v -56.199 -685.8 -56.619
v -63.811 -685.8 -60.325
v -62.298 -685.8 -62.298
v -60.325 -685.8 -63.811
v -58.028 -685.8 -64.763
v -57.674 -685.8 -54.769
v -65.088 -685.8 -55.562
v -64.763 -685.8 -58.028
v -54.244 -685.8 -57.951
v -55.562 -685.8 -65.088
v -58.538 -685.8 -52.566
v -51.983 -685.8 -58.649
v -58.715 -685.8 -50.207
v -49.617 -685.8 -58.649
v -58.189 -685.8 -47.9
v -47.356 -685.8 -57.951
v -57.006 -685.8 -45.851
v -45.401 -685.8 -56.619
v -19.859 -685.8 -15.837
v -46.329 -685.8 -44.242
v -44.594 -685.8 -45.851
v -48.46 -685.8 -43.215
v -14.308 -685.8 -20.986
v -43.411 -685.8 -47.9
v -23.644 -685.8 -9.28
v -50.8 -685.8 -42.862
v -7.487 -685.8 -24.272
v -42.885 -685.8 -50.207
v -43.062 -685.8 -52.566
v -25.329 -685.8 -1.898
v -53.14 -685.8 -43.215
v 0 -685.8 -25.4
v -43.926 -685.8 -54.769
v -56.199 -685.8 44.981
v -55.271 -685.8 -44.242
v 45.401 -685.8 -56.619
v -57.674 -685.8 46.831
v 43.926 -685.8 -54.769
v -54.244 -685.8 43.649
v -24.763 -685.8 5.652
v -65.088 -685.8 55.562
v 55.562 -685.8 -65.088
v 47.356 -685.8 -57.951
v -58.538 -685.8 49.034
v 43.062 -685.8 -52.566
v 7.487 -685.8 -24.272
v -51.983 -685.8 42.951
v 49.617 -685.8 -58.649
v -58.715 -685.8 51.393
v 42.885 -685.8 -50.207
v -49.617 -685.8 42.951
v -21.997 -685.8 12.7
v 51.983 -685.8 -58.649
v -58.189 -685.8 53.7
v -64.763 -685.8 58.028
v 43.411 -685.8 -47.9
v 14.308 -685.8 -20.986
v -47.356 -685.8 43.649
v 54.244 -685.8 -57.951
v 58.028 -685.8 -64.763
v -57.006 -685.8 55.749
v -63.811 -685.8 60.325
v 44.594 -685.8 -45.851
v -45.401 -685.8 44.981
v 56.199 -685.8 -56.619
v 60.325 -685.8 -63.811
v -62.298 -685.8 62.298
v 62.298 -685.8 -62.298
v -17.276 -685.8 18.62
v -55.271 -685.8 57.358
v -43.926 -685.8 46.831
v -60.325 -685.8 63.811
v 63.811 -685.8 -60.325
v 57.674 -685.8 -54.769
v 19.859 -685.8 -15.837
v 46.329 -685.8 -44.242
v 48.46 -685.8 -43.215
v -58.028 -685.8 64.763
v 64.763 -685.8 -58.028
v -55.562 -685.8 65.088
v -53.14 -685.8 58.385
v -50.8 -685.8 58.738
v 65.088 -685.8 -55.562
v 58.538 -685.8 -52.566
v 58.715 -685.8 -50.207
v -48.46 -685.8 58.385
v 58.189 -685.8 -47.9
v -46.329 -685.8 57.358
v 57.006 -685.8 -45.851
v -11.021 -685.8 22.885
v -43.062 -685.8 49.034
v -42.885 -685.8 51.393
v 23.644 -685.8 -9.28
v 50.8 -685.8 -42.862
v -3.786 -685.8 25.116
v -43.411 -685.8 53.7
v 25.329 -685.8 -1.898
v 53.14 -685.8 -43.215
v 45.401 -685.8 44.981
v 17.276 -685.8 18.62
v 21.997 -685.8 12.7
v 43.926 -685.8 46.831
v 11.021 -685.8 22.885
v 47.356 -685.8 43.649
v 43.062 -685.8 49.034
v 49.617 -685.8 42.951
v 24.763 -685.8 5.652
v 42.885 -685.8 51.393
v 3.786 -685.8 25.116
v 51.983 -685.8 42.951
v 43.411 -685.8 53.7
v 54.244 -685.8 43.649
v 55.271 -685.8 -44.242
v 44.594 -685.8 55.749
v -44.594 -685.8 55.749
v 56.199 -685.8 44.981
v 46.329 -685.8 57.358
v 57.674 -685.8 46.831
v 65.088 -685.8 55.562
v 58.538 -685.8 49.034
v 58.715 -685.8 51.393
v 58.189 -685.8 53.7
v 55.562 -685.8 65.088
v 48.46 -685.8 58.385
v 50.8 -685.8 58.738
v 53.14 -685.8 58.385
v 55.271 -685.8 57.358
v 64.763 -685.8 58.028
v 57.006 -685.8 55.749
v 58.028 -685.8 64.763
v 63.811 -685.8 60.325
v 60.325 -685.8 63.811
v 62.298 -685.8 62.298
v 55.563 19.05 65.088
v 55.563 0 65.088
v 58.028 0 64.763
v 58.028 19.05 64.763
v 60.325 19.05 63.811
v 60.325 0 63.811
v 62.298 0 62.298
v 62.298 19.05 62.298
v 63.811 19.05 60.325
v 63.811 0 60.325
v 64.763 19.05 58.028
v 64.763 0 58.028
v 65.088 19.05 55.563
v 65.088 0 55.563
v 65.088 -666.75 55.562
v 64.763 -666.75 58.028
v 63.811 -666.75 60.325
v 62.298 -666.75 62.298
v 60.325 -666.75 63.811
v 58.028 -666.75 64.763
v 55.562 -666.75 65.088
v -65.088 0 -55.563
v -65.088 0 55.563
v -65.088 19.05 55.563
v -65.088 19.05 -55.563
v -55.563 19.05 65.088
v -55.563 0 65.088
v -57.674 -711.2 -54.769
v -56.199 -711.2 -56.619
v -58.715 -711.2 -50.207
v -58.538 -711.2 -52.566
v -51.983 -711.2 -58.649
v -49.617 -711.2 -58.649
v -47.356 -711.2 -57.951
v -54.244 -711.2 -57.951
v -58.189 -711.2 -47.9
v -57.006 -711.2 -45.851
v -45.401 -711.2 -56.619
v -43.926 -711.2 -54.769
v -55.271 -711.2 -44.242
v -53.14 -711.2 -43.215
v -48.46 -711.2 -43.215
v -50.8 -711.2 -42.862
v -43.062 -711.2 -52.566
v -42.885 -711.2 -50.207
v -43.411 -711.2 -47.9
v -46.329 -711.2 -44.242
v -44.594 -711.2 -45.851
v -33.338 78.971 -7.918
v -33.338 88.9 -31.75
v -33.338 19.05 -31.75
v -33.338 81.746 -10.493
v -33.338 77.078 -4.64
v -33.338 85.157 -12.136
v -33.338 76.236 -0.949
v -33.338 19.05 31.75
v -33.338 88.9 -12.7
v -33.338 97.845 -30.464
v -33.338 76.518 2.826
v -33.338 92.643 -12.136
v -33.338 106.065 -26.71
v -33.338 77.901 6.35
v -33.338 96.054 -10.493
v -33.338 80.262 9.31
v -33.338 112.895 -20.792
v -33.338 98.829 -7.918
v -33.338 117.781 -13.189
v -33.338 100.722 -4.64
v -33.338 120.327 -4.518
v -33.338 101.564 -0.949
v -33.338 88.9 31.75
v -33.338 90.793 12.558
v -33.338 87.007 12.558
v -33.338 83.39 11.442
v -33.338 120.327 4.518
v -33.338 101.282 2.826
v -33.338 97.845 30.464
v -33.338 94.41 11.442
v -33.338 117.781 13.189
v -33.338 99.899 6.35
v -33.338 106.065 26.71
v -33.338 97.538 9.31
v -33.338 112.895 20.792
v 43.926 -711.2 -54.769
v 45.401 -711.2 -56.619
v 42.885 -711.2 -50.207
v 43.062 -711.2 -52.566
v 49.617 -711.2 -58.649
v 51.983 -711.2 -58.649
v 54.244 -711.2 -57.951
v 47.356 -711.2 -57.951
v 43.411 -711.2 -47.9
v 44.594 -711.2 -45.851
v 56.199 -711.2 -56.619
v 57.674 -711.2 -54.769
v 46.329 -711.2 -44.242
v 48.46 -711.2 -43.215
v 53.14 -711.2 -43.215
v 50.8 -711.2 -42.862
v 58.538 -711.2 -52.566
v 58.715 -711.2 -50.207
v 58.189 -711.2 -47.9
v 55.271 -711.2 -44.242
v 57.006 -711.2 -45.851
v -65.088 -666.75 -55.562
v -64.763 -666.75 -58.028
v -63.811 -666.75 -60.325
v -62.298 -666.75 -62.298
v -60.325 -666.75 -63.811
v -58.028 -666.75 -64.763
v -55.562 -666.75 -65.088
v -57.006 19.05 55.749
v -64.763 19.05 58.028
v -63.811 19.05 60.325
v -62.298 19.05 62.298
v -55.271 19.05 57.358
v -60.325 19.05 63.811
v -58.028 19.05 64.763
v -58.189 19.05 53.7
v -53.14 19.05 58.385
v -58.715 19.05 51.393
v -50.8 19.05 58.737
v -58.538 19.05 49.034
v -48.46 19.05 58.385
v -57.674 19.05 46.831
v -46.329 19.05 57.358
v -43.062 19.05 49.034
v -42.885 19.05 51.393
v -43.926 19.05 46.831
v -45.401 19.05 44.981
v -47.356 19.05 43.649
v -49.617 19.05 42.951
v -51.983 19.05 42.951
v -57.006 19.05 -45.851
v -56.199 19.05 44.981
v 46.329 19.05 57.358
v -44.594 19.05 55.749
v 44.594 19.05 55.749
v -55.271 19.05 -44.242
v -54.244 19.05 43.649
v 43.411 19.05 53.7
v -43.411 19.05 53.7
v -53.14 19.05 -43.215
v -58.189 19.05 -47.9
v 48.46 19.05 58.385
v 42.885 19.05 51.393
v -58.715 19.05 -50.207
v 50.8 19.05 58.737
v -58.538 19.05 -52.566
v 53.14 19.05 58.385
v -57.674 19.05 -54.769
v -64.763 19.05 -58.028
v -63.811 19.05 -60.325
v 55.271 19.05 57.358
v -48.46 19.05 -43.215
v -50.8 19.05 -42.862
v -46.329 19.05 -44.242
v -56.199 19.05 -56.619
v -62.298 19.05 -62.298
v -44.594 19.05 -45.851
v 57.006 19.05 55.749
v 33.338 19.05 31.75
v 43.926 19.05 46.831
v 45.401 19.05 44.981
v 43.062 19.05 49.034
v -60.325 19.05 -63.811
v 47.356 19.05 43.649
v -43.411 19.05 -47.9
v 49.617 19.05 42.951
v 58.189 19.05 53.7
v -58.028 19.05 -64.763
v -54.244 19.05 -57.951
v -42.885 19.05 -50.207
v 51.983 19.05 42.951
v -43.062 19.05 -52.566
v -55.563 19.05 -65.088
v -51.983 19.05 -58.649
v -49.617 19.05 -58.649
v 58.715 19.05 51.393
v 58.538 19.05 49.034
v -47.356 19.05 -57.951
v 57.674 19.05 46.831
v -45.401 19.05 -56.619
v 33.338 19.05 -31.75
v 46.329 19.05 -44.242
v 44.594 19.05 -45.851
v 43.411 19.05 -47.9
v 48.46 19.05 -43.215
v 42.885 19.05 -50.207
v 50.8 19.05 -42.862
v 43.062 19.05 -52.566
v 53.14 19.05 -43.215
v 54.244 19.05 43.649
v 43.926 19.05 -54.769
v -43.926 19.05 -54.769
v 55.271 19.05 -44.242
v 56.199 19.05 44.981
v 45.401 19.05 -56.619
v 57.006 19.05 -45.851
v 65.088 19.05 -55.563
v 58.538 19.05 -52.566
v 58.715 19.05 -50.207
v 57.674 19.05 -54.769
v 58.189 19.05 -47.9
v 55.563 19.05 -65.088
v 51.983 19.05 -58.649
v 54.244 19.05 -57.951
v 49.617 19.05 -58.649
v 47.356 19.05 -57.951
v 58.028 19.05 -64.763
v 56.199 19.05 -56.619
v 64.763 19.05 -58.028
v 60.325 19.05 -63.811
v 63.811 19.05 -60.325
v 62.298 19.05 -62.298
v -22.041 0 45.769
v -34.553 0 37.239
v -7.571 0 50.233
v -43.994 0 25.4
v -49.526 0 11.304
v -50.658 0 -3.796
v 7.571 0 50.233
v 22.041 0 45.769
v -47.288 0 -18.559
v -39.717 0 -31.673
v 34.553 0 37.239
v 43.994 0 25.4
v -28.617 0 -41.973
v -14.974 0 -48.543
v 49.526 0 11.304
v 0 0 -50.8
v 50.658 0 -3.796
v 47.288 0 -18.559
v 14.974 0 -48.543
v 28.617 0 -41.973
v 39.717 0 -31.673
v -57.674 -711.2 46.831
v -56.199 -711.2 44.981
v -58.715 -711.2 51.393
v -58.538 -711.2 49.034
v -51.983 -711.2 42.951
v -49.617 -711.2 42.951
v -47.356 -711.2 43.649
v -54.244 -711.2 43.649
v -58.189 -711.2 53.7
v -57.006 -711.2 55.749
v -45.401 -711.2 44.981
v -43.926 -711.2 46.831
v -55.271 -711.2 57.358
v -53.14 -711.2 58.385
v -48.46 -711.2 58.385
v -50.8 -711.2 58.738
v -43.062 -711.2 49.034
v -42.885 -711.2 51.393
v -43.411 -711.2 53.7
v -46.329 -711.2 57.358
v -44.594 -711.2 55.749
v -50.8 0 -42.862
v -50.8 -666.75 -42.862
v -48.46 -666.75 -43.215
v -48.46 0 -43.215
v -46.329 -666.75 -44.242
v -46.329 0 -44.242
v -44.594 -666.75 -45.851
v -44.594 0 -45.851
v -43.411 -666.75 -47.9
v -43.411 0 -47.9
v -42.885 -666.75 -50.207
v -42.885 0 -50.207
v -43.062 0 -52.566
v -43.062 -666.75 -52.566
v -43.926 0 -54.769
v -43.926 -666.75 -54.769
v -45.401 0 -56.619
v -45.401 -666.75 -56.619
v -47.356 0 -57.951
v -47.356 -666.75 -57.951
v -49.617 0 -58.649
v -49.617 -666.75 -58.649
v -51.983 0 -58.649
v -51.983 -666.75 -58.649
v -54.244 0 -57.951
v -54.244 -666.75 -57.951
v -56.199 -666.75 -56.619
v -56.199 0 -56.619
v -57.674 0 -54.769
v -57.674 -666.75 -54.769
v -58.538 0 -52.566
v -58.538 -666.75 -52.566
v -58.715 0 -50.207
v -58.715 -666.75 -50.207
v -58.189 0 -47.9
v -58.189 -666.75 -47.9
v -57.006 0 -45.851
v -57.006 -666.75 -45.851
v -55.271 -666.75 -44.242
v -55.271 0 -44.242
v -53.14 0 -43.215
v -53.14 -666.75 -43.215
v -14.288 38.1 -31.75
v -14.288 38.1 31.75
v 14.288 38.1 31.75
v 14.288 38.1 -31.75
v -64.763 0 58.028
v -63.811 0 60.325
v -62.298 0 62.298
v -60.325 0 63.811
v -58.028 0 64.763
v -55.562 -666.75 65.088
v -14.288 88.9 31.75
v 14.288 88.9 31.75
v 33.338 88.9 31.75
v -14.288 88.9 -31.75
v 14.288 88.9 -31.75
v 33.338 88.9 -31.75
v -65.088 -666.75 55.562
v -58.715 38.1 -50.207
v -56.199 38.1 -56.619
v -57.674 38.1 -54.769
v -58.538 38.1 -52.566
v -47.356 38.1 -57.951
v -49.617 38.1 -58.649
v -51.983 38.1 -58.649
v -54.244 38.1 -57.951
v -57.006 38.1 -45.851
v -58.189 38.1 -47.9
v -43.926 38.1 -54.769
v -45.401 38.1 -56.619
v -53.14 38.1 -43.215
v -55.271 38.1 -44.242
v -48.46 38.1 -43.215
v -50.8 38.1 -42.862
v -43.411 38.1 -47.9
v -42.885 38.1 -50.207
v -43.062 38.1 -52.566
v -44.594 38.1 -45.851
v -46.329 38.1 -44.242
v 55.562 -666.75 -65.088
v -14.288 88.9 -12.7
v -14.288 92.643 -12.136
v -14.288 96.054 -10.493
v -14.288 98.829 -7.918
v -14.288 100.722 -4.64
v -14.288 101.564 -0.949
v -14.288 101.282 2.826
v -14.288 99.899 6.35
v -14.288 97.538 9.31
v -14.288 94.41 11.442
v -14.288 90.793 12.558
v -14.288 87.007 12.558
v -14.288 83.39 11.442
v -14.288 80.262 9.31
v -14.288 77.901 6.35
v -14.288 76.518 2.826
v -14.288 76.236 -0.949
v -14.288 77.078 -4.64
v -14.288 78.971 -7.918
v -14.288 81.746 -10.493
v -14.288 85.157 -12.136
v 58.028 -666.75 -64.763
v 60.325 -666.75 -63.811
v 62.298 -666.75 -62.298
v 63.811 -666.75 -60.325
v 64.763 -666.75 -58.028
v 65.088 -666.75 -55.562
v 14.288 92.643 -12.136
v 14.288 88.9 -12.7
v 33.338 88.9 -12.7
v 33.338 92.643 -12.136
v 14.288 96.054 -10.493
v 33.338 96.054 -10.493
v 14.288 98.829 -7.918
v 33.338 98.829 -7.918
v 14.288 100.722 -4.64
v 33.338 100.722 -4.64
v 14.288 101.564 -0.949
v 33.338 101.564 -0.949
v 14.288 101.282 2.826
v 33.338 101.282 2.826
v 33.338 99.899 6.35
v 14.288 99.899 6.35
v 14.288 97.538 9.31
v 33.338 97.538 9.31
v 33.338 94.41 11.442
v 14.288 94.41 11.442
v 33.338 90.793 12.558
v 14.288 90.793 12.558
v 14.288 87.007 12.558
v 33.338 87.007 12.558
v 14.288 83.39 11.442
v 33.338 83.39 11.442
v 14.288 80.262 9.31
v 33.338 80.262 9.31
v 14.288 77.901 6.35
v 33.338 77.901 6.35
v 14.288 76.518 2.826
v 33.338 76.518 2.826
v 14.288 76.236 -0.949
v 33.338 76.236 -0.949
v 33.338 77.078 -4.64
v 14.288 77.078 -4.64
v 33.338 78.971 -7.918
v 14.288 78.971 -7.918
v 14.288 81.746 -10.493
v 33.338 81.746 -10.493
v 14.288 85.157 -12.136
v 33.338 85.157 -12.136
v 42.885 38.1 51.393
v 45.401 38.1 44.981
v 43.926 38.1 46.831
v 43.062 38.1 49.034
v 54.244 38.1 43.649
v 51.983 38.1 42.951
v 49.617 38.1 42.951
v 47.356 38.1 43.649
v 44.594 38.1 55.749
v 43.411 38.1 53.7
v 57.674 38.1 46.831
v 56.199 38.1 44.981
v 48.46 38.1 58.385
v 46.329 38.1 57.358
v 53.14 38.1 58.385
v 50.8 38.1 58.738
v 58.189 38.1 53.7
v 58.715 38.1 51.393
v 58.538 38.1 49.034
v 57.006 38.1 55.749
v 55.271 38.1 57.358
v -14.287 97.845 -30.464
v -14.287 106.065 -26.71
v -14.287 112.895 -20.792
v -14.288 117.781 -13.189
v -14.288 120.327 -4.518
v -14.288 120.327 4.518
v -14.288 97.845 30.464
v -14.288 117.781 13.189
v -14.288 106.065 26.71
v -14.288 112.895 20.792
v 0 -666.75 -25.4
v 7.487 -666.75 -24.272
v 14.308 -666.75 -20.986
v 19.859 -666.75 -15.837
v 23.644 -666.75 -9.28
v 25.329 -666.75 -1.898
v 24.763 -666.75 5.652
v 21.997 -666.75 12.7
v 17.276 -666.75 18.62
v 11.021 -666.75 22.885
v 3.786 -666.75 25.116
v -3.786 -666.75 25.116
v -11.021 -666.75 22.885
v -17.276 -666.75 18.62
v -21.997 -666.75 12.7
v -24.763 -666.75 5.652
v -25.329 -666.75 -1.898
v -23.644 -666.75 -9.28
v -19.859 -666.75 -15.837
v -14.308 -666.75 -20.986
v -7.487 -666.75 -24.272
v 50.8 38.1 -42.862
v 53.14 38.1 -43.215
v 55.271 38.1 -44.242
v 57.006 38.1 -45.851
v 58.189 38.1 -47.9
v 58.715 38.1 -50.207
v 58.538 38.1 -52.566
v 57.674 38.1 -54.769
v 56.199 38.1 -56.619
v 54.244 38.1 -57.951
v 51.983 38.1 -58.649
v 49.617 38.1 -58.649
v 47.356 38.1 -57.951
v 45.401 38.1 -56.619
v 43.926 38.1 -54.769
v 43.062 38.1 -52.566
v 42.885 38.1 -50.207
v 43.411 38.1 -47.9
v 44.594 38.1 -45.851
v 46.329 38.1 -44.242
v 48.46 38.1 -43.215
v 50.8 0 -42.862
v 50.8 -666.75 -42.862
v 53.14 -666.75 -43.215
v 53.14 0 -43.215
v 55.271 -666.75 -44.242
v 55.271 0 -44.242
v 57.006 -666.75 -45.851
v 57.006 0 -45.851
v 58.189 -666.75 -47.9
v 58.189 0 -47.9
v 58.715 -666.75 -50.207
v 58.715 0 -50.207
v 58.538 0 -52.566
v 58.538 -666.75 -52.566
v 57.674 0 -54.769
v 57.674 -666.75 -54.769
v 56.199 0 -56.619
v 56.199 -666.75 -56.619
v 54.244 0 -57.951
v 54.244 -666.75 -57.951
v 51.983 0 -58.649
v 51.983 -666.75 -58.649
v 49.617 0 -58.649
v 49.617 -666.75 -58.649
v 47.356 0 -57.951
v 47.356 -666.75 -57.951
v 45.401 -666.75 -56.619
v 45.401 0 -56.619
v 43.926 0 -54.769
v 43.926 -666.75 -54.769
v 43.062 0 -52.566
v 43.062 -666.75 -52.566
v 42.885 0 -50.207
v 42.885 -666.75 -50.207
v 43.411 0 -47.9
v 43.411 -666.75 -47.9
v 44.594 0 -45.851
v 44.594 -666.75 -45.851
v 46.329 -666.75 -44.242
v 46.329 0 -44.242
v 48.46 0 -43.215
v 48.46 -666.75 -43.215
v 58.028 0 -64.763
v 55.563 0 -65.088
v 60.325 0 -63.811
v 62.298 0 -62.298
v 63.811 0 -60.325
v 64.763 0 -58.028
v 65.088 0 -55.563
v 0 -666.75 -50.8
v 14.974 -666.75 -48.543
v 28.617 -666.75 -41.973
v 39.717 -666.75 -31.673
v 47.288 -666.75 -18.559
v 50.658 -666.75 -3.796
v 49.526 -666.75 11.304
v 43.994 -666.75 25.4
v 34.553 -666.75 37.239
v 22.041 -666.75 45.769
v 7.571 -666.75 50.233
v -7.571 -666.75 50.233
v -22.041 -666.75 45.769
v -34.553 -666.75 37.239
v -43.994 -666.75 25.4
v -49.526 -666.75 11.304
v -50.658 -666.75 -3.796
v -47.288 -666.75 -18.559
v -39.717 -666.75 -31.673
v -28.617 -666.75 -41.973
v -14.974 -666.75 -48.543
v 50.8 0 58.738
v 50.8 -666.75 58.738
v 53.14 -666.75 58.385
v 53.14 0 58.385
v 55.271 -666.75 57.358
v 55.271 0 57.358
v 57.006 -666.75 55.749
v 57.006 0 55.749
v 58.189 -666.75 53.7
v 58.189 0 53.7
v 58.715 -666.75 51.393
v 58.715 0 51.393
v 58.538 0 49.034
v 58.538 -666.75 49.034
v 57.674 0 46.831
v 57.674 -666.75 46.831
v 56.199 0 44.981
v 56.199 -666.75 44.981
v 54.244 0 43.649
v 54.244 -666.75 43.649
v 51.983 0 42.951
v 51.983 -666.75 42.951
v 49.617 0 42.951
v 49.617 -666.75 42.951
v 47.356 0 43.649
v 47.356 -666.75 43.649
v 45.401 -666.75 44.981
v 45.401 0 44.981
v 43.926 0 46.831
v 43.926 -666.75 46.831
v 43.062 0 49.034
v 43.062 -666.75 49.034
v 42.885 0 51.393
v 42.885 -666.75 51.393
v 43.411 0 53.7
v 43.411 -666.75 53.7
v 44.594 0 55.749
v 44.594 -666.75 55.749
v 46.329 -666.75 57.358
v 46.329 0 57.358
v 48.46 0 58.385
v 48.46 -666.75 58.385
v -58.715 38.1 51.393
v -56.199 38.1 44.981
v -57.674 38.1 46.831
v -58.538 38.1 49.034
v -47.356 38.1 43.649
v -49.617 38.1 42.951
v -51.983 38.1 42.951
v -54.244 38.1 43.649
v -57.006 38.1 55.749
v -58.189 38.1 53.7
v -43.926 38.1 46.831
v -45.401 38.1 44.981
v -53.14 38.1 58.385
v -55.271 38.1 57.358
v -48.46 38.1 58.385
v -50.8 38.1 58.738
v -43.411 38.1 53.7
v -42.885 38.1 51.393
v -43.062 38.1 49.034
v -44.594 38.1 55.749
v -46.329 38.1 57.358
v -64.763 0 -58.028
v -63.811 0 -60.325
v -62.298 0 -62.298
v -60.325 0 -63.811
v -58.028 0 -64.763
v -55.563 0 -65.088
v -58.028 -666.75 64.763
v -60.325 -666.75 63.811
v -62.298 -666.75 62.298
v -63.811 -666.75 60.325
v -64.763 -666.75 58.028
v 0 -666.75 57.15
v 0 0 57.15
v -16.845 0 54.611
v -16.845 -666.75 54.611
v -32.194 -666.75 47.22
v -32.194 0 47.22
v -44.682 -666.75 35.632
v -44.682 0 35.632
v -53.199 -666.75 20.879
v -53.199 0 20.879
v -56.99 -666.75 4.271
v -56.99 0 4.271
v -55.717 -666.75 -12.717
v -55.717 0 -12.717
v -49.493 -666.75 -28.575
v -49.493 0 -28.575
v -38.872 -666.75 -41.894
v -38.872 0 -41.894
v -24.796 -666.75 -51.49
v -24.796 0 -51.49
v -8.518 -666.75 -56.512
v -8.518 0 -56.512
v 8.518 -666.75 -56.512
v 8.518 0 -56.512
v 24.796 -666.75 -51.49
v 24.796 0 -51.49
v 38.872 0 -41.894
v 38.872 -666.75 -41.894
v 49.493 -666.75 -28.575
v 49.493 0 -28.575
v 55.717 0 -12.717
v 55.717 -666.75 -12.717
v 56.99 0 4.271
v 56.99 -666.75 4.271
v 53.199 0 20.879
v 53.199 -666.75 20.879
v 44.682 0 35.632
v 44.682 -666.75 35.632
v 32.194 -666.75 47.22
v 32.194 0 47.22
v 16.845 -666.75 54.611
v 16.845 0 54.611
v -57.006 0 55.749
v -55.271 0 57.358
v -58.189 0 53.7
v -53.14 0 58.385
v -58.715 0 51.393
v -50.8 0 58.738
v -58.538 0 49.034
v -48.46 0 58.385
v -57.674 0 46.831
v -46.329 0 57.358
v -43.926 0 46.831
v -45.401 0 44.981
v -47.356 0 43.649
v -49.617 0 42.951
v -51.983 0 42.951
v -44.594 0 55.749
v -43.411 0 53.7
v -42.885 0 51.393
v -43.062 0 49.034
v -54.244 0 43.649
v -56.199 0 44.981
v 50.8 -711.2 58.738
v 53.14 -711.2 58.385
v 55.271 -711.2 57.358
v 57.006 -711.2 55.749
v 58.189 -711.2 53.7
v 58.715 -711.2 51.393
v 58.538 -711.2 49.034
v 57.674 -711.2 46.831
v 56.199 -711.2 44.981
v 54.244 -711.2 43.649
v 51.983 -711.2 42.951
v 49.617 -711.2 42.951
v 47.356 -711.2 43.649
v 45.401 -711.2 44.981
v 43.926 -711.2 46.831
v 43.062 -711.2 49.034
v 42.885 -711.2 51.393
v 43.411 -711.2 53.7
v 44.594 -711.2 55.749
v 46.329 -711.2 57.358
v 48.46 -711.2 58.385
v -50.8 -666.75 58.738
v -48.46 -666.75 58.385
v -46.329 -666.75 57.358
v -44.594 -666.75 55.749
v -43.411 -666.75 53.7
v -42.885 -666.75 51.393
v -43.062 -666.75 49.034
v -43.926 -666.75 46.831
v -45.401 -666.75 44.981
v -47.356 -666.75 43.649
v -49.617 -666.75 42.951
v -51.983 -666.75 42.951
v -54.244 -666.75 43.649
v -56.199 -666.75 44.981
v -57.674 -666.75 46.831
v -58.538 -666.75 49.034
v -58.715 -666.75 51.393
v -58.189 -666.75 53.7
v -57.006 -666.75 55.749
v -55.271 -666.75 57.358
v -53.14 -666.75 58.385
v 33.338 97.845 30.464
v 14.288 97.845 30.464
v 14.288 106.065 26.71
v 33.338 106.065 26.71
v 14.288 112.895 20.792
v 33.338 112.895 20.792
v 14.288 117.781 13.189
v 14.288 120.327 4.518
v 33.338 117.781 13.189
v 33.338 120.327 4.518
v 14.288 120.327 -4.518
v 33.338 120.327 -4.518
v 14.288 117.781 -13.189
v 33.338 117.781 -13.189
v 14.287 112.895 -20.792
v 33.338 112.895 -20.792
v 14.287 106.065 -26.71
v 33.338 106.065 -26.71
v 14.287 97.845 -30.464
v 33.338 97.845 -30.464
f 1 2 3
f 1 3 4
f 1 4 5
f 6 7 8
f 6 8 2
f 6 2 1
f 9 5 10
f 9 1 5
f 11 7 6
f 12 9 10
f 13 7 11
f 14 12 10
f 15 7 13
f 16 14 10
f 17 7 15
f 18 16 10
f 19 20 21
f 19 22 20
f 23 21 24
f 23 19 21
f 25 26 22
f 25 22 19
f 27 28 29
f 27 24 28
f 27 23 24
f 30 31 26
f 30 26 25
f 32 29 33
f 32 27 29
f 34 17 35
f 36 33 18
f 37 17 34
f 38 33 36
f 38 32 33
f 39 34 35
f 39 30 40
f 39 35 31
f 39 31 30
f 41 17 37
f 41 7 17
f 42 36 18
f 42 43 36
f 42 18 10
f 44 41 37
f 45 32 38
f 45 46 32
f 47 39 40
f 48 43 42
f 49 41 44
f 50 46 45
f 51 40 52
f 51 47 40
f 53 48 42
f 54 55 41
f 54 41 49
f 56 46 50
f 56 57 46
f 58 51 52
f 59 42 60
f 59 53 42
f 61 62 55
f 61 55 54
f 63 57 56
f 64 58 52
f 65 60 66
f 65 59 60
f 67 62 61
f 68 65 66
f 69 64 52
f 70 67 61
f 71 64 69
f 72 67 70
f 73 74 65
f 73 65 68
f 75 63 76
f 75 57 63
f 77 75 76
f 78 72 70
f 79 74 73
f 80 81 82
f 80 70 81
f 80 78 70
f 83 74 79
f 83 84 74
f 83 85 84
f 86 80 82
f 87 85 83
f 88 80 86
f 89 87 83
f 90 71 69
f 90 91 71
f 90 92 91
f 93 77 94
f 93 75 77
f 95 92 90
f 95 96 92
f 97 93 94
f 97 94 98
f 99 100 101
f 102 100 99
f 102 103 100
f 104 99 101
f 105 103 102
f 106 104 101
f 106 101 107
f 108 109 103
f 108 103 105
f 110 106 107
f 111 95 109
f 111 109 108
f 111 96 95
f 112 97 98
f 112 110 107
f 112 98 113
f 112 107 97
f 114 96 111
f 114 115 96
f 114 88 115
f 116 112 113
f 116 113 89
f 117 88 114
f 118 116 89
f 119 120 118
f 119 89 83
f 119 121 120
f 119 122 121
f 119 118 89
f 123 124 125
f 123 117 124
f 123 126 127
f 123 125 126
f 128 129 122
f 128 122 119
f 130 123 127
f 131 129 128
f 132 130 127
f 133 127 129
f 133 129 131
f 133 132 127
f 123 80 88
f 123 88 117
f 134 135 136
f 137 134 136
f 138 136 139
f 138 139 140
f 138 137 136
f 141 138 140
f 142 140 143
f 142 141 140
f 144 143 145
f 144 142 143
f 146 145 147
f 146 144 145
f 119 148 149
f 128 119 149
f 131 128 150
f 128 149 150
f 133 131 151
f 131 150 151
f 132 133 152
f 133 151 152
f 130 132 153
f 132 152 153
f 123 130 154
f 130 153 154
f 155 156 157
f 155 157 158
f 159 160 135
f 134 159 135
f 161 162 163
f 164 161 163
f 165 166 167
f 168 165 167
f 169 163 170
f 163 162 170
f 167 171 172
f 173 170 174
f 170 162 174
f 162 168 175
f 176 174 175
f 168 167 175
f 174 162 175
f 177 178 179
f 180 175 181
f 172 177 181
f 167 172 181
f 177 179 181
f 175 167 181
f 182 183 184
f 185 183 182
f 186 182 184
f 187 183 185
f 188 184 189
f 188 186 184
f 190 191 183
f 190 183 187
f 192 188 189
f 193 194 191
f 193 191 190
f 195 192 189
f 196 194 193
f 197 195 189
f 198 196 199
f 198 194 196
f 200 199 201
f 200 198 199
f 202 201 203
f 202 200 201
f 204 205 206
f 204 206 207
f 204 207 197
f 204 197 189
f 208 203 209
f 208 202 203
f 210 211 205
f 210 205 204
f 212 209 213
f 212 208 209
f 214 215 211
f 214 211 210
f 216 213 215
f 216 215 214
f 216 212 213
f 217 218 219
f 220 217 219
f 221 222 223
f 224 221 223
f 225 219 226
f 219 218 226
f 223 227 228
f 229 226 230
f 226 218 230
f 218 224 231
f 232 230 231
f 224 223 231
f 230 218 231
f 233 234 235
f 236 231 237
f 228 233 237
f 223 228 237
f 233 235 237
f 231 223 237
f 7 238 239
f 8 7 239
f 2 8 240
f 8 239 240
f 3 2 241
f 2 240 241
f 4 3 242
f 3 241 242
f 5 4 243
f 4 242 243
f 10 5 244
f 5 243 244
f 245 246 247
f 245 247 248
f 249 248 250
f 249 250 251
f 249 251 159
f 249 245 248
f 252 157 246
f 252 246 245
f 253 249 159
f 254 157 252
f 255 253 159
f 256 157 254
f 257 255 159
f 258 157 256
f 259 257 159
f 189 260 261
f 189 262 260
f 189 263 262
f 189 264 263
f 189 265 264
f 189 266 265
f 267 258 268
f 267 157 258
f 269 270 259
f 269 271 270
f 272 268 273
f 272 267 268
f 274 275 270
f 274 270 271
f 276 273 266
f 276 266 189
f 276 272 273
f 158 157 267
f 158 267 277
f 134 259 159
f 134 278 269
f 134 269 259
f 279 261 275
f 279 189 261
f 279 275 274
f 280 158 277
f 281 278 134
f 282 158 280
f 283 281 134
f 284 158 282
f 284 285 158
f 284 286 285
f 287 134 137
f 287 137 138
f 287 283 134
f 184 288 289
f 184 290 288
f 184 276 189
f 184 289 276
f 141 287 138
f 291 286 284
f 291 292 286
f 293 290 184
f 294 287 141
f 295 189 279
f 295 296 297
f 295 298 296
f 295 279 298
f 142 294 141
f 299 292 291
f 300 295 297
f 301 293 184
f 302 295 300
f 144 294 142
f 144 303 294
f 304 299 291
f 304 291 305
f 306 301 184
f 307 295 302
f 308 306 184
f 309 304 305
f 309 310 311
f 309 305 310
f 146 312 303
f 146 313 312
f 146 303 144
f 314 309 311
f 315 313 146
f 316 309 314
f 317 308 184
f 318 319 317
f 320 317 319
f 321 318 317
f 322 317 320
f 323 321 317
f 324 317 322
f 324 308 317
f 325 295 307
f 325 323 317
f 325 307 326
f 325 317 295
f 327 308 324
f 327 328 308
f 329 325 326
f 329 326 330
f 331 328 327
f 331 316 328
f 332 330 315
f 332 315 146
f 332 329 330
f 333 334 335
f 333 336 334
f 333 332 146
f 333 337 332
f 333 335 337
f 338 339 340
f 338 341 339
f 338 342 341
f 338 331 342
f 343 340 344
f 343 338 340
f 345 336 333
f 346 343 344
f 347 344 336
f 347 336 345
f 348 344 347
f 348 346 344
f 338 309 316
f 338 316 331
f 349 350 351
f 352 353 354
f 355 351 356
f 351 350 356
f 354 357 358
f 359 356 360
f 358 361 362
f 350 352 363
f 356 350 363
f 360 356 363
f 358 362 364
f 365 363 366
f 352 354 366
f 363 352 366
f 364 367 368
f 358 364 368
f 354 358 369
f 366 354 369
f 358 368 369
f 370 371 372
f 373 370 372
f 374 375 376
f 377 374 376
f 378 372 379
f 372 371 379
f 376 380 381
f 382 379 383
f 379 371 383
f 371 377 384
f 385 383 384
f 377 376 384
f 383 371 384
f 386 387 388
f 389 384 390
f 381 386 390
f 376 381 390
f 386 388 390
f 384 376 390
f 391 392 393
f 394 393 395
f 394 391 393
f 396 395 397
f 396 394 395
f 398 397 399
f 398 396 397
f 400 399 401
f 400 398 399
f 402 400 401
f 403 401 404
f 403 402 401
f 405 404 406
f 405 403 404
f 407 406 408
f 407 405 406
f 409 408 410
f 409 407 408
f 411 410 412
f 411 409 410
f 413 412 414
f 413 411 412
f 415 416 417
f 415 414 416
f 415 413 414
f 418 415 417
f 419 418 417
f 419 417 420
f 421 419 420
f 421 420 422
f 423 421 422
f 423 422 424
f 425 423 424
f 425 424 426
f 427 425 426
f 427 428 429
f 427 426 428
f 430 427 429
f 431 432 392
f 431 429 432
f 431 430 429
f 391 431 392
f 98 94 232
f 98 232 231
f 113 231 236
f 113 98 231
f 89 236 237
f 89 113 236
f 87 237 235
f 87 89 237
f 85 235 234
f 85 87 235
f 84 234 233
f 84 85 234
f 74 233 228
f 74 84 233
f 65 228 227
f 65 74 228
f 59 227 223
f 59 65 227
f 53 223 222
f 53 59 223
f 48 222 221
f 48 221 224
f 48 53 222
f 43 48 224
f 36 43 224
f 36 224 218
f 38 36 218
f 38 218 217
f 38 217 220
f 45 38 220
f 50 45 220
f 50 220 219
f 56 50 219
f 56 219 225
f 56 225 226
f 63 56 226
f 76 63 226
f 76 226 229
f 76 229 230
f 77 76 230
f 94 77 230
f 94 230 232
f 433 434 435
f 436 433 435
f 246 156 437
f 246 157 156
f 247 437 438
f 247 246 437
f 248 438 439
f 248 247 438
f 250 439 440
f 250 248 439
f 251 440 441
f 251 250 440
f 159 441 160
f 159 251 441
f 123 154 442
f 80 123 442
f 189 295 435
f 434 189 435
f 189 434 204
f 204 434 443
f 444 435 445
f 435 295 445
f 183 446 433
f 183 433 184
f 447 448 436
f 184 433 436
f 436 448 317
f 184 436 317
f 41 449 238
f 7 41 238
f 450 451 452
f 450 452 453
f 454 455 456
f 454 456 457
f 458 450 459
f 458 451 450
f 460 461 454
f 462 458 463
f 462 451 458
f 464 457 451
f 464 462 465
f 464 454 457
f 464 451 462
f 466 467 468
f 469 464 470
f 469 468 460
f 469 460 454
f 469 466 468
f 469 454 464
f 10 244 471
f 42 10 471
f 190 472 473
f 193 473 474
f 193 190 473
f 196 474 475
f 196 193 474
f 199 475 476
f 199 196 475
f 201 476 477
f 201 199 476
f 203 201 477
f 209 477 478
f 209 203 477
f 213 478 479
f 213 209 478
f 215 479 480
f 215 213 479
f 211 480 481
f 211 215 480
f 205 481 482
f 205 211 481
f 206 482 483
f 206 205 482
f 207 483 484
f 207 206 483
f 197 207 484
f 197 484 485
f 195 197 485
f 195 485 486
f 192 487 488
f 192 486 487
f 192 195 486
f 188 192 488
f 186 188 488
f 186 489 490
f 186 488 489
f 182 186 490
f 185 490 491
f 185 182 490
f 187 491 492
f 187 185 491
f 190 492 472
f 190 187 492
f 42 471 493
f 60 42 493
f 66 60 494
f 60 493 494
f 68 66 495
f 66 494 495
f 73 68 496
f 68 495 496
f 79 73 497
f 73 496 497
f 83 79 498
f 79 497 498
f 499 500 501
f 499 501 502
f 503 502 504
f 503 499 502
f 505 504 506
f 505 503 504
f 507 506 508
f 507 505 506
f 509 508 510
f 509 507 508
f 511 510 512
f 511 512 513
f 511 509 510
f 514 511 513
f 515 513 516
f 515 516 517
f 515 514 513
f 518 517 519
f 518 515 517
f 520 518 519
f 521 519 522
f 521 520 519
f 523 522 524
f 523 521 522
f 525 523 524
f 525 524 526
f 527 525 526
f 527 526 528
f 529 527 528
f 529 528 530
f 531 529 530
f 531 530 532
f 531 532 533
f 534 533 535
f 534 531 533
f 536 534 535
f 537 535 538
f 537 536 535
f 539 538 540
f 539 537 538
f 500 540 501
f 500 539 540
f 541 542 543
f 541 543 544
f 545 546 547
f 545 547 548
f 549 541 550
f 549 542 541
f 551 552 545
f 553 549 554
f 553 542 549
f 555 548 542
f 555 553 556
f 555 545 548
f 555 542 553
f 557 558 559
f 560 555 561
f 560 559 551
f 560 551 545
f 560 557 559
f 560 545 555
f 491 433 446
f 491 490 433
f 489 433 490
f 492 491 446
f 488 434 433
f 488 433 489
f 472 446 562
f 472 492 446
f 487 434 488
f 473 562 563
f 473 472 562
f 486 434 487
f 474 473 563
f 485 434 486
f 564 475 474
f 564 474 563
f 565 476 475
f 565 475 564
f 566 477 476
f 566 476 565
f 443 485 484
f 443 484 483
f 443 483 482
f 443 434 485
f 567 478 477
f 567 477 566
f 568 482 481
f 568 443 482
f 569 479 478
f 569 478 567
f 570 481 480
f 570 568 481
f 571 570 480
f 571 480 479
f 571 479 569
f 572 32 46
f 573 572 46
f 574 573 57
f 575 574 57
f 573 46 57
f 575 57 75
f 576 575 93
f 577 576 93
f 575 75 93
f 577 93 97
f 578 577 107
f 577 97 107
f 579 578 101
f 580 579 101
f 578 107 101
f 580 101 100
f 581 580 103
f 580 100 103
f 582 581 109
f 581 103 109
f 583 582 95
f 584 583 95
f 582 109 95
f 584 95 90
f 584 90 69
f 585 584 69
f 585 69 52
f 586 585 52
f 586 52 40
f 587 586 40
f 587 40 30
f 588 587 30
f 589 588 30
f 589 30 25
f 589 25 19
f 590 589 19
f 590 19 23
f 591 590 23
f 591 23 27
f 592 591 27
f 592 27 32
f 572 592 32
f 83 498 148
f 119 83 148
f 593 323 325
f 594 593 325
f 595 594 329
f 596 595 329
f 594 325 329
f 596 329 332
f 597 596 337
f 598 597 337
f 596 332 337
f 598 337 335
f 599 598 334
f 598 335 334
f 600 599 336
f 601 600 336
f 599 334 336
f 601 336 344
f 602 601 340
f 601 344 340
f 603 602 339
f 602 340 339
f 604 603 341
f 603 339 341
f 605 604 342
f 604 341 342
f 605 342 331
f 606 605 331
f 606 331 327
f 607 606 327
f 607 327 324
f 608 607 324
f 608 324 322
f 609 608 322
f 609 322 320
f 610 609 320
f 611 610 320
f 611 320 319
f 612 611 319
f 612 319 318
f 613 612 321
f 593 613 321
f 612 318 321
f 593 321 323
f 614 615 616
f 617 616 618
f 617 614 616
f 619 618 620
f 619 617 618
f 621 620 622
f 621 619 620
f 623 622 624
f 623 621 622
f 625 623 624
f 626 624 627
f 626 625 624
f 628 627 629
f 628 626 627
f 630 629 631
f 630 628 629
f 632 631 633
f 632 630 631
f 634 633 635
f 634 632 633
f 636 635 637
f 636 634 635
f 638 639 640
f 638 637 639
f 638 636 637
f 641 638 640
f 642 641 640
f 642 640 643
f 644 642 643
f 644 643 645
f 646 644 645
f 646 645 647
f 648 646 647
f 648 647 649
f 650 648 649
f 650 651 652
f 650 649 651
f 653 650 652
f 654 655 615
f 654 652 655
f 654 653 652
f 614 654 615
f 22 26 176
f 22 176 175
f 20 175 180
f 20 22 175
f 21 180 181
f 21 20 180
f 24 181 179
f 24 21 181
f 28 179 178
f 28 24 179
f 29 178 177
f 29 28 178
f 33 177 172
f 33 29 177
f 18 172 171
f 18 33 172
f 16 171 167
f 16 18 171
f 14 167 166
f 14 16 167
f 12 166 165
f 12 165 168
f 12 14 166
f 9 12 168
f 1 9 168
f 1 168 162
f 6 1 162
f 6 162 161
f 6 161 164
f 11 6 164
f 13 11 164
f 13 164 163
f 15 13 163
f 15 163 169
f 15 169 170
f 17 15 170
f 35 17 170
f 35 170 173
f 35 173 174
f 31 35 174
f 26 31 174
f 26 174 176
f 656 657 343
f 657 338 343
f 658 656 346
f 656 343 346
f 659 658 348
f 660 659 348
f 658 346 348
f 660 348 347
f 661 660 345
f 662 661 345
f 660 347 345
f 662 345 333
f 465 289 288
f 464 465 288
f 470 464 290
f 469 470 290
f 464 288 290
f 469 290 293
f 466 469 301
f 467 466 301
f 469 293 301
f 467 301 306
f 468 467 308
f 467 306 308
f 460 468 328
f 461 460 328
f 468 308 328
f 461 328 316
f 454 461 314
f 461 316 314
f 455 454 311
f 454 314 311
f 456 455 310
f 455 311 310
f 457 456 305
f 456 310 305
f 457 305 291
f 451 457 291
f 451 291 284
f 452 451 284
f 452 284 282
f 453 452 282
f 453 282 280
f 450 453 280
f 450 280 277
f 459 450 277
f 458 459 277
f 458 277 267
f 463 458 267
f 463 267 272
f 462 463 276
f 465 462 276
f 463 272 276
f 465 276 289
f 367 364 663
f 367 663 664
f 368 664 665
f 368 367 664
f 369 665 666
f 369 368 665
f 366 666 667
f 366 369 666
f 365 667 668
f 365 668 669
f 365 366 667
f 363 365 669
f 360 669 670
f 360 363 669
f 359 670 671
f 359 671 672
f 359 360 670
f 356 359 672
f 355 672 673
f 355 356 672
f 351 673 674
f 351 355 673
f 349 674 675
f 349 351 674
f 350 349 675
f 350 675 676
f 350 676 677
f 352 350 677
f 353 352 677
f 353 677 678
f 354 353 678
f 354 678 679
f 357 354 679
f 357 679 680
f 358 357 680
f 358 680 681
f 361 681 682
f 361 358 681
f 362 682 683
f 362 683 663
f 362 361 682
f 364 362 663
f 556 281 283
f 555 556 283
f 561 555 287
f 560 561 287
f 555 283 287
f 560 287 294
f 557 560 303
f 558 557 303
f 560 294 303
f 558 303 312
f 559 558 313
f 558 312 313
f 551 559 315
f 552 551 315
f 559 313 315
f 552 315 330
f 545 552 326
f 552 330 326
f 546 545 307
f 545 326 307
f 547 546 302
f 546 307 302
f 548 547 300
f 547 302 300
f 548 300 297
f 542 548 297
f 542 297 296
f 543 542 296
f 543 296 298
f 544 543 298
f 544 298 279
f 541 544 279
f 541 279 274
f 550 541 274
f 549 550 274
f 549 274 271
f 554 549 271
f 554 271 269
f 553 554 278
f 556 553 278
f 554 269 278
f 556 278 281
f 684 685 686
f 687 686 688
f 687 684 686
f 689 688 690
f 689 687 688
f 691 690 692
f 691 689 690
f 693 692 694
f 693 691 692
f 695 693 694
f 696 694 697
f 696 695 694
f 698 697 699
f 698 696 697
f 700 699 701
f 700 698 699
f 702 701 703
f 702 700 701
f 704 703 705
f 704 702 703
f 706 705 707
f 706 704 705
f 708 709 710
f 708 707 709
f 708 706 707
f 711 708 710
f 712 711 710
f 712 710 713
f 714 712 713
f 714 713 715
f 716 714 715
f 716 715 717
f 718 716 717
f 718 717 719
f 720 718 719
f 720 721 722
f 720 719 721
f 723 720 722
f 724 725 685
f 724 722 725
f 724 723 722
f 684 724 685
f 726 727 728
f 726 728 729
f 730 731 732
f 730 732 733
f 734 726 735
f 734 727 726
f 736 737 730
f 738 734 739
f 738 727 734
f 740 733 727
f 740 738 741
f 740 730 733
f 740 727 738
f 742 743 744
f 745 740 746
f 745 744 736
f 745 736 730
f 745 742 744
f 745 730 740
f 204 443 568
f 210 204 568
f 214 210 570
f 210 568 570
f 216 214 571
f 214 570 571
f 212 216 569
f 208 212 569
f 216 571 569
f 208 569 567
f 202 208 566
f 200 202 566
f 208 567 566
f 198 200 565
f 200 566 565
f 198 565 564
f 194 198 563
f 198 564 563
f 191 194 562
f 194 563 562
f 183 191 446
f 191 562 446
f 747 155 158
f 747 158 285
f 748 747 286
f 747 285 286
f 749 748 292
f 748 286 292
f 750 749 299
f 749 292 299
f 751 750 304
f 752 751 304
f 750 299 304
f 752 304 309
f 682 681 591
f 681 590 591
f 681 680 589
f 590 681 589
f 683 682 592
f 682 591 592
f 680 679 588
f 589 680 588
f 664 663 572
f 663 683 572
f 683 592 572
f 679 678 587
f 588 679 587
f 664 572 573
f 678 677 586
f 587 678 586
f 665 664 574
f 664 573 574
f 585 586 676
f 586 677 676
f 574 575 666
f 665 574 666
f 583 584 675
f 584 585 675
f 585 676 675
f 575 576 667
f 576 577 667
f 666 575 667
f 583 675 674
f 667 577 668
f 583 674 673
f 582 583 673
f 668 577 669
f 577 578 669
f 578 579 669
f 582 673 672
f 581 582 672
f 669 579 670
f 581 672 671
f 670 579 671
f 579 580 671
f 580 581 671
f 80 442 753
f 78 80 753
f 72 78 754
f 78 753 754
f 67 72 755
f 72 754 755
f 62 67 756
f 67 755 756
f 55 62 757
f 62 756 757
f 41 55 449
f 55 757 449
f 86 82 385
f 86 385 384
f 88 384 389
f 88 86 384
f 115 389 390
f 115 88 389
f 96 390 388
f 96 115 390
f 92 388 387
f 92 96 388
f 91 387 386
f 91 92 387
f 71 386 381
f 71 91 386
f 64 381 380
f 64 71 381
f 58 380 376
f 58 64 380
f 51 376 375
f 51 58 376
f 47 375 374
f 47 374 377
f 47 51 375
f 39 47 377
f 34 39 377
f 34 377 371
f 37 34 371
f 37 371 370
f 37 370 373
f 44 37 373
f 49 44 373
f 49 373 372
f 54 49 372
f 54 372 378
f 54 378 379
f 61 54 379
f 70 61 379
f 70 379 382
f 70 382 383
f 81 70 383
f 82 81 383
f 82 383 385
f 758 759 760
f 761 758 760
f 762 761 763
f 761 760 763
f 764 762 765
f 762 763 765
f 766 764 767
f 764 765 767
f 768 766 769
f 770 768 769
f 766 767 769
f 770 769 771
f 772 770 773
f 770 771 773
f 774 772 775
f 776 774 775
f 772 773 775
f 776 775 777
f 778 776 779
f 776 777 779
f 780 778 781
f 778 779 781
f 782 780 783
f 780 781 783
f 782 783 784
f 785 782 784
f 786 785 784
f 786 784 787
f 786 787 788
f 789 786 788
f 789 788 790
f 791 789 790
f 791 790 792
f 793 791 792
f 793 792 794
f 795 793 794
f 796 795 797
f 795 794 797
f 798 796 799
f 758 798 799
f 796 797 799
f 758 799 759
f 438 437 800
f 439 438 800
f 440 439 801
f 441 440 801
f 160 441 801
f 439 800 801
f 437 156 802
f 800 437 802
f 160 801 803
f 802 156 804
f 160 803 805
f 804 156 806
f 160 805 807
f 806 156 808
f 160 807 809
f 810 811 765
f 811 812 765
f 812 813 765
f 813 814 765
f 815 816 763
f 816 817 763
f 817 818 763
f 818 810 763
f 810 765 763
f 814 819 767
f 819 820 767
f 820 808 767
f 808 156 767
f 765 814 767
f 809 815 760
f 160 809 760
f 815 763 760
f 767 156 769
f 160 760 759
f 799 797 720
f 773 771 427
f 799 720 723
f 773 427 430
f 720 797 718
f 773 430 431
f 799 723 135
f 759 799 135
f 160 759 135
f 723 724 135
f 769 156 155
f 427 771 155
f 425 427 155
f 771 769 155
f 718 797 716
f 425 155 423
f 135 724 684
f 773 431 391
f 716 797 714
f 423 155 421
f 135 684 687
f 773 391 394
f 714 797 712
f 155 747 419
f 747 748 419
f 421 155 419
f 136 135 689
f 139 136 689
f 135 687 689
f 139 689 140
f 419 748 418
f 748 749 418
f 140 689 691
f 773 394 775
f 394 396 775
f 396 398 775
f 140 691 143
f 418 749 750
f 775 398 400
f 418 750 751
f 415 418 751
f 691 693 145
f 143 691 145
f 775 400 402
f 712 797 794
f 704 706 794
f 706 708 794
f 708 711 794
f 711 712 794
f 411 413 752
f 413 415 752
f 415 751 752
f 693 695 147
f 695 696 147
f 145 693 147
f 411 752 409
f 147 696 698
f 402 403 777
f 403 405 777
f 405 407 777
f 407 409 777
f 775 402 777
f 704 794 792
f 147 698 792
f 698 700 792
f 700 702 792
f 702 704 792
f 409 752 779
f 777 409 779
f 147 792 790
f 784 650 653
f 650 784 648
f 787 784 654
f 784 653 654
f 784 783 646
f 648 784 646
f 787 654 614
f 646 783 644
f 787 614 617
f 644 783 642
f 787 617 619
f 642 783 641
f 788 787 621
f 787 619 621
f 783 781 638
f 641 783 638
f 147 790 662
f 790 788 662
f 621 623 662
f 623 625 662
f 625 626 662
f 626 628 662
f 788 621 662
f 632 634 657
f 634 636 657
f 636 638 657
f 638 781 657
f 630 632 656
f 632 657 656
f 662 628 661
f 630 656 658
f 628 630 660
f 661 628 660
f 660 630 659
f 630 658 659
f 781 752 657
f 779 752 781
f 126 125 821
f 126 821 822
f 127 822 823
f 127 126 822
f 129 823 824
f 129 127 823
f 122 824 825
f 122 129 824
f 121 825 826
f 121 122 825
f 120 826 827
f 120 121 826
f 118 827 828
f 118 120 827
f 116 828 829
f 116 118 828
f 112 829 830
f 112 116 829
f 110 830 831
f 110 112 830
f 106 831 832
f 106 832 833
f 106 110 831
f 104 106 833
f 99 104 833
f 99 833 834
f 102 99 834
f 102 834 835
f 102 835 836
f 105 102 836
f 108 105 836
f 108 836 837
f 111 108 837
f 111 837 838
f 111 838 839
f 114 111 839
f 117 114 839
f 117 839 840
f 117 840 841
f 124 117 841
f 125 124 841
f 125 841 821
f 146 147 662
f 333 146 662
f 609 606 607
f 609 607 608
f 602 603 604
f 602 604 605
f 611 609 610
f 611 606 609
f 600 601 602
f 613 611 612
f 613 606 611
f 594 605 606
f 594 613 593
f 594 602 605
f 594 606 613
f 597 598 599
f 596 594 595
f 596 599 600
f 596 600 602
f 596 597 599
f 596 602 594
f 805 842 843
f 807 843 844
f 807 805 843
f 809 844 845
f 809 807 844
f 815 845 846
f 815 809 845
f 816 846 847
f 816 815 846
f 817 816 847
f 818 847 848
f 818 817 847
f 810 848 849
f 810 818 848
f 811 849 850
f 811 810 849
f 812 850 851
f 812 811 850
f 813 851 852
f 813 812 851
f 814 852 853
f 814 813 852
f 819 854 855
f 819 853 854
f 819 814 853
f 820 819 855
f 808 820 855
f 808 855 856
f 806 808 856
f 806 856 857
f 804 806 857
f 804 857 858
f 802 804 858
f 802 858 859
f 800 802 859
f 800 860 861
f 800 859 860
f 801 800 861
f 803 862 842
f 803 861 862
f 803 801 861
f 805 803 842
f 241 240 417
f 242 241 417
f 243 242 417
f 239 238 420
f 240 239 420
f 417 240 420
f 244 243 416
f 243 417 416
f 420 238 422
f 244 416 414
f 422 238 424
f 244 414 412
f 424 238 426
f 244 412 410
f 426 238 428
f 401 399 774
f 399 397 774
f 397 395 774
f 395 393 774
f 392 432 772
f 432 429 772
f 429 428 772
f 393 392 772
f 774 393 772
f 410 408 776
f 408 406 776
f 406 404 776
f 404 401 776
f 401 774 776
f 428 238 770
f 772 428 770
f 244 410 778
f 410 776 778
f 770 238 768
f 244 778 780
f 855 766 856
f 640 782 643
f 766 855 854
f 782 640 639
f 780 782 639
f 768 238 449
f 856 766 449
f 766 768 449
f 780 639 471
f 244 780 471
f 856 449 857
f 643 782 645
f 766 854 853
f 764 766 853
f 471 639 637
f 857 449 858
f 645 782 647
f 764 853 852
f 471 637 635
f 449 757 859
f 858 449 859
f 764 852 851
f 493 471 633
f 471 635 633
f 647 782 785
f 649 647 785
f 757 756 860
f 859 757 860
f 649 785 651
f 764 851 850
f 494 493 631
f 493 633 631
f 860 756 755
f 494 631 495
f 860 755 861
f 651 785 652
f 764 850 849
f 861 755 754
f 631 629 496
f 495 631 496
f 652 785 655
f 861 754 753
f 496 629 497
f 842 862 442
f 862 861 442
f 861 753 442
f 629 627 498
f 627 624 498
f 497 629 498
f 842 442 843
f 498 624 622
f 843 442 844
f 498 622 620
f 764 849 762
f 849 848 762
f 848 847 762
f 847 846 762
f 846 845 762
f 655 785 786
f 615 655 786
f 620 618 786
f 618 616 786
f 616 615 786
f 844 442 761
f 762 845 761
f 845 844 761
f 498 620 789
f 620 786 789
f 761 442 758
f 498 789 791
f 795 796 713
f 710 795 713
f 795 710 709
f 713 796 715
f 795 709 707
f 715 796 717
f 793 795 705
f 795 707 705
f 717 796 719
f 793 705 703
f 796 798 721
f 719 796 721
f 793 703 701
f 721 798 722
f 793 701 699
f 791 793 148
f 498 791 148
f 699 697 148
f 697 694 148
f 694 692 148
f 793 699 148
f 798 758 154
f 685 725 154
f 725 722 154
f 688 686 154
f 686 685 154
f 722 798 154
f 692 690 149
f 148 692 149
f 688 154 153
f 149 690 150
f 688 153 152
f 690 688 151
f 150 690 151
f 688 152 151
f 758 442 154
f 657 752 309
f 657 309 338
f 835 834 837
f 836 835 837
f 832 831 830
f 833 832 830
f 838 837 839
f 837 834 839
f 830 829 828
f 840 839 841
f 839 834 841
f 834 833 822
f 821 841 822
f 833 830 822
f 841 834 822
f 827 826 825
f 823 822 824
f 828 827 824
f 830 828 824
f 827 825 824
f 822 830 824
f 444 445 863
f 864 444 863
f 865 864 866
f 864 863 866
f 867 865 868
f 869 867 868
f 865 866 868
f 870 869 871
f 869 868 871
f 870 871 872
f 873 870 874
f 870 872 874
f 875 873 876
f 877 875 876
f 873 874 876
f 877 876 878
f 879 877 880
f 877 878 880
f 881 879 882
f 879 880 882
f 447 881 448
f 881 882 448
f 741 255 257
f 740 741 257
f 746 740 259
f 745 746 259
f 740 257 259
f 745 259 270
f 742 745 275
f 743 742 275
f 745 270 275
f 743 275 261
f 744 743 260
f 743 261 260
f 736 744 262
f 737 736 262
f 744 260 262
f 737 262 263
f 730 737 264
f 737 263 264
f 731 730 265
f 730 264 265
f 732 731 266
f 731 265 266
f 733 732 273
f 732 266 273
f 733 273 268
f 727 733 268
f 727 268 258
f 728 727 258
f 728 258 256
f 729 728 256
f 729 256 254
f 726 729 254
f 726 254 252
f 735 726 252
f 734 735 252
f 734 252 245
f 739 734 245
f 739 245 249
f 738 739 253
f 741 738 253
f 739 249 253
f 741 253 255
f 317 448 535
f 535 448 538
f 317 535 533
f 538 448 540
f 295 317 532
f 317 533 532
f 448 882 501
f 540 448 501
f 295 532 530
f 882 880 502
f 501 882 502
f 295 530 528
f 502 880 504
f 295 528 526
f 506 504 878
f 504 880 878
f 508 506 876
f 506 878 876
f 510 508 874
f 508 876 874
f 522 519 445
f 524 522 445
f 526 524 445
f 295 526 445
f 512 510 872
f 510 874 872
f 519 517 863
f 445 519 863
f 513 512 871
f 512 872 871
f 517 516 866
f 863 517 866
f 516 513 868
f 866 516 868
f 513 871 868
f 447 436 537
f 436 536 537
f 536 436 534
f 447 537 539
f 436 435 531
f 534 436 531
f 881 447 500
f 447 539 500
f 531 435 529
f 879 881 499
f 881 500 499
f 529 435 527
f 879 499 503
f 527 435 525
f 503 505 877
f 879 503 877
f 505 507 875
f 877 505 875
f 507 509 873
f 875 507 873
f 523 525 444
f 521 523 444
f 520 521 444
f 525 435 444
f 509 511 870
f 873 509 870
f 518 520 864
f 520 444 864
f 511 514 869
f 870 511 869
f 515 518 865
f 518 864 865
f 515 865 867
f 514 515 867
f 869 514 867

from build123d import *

# Parameters (mm, degrees)
SKETCH1_W                = 130.175
SKETCH1_H                = 130.175
BOSS_EXTRUDE1_DEPTH      = 19.05
CUT_EXTRUDE1_REACH       = 21.05
SKETCH2_R                = 7.9375
SKETCH3_R                = 12.7
BOSS_EXTRUDE2_DEPTH      = 33.3375
CUT_EXTRUDE2_REACH       = 98.837
SKETCH4_W                = 28.575
SKETCH4_H                = 82.55
SKETCH5_R                = 57.15
SKETCH5_R_2              = 50.8
BOSS_EXTRUDE3_DEPTH      = 666.75
FILLET1_R                = 9.525
SKETCH6_R                = 7.9375
BOSS_EXTRUDE4_DEPTH      = 19.05
CUT_EXTRUDE3_REACH       = 808.45
SKETCH7_R                = 25.4
SKETCH8_R                = 7.9375
BOSS_EXTRUDE5_DEPTH      = 19.05
BOSS_EXTRUDE5_DEPTH_BACK = 730.25


with BuildPart() as part:
    # Sketch1 → Boss-Extrude1 (new body)
    with BuildSketch(Plane(origin=(0, 0, 0), x_dir=(1, 0, 0), z_dir=(0, 1, 0))):
        Rectangle(SKETCH1_W, SKETCH1_H)
    extrude(amount=BOSS_EXTRUDE1_DEPTH)

    # Sketch2 → Cut-Extrude1 (cut, up to next)
    with BuildSketch(Plane(origin=(0, 19.05, 0), x_dir=(1, 0, 0), z_dir=(0, 1, 0)), mode=Mode.PRIVATE) as cut_extrude1_sk1:
        with Locations(Location((-50.8, 50.8, 0), (0, 0, 270))):  # turned: the seam where the file's is
            Circle(SKETCH2_R)
    cut_extrude1_tool1 = extrude(cut_extrude1_sk1.sketch, amount=-CUT_EXTRUDE1_REACH, mode=Mode.PRIVATE) & part.part
    add(cut_extrude1_tool1.solids().sort_by_distance((-50.8, 19.05, -50.8))[0], mode=Mode.SUBTRACT)
    # Sketch2 → Cut-Extrude1 (cut, up to next)
    with BuildSketch(Plane(origin=(0, 19.05, 0), x_dir=(1, 0, 0), z_dir=(0, 1, 0)), mode=Mode.PRIVATE) as cut_extrude1_sk2:
        with Locations(Location((50.8, 50.8, 0), (0, 0, 270))):  # turned: the seam where the file's is
            Circle(SKETCH2_R)
    cut_extrude1_tool2 = extrude(cut_extrude1_sk2.sketch, amount=-CUT_EXTRUDE1_REACH, mode=Mode.PRIVATE) & part.part
    add(cut_extrude1_tool2.solids().sort_by_distance((50.8, 19.05, -50.8))[0], mode=Mode.SUBTRACT)
    # Sketch2 → Cut-Extrude1 (cut, up to next)
    with BuildSketch(Plane(origin=(0, 19.05, 0), x_dir=(1, 0, 0), z_dir=(0, 1, 0)), mode=Mode.PRIVATE) as cut_extrude1_sk3:
        with Locations(Location((50.8, -50.8, 0), (0, 0, 270))):  # turned: the seam where the file's is
            Circle(SKETCH2_R)
    cut_extrude1_tool3 = extrude(cut_extrude1_sk3.sketch, amount=-CUT_EXTRUDE1_REACH, mode=Mode.PRIVATE) & part.part
    add(cut_extrude1_tool3.solids().sort_by_distance((50.8, 19.05, 50.8))[0], mode=Mode.SUBTRACT)
    # Sketch2 → Cut-Extrude1 (cut, up to next)
    with BuildSketch(Plane(origin=(0, 19.05, 0), x_dir=(1, 0, 0), z_dir=(0, 1, 0)), mode=Mode.PRIVATE) as cut_extrude1_sk4:
        with Locations(Location((-50.8, -50.8, 0), (0, 0, 270))):  # turned: the seam where the file's is
            Circle(SKETCH2_R)
    cut_extrude1_tool4 = extrude(cut_extrude1_sk4.sketch, amount=-CUT_EXTRUDE1_REACH, mode=Mode.PRIVATE) & part.part
    add(cut_extrude1_tool4.solids().sort_by_distance((-50.8, 19.05, 50.8))[0], mode=Mode.SUBTRACT)

    # Sketch3 → Boss-Extrude2 (add, symmetric)
    with BuildSketch(Plane(origin=(0, 0, 0), x_dir=(0, 0, -1), z_dir=(1, 0, 0))):
        with BuildLine():
            Line((-31.75, 19.05), (-31.75, 88.9))
            ThreePointArc((-31.75, 88.9), (0, 120.65), (31.75, 88.9))
            Line((31.75, 88.9), (31.75, 19.05))
            Line((31.75, 19.05), (-31.75, 19.05))
        make_face()
        with Locations((0, 88.9)):
            Circle(SKETCH3_R, mode=Mode.SUBTRACT)
    extrude(amount=BOSS_EXTRUDE2_DEPTH, both=True)

    # Sketch4 → Cut-Extrude2 (cut, up to next)
    with BuildSketch(Plane.XY.offset(31.75), mode=Mode.PRIVATE) as cut_extrude2_sk1:
        with Locations((0, 79.375)):
            Rectangle(SKETCH4_W, SKETCH4_H)
    cut_extrude2_tool1 = extrude(cut_extrude2_sk1.sketch, amount=-CUT_EXTRUDE2_REACH, mode=Mode.PRIVATE) & part.part
    add(cut_extrude2_tool1.solids().sort_by_distance((0, 79.375, 31.75))[0], mode=Mode.SUBTRACT)

    # Sketch5 → Boss-Extrude3 (add)
    with BuildSketch(Plane.XZ):
        with Locations(Location((0, 0, 0), (0, 0, 90))):  # turned: the seam where the file's is
            Circle(SKETCH5_R)
        with Locations(Location((0, 0, 0), (0, 0, 270))):  # turned: the seam where the file's is
            Circle(SKETCH5_R_2, mode=Mode.SUBTRACT)
    extrude(amount=BOSS_EXTRUDE3_DEPTH)

    # Fillet1
    fillet1_edges = [part.edges().sort_by_distance(p)[0] for p in [
        (65.0875, 9.525, 65.0875),
        (-65.0875, 9.525, 65.0875),
        (-65.0875, 9.525, -65.0875),
        (65.0875, 9.525, -65.0875),
    ]]
    fillet(fillet1_edges, radius=FILLET1_R)

    # Sketch6 → Boss-Extrude4 (add)
    with BuildSketch(Plane.XZ.offset(666.75)):
        with BuildLine():
            Line((-65.0875, 55.5625), (-65.0875, -55.5625))
            ThreePointArc((-65.0875, -55.5625), (-62.297692091, -62.297692091), (-55.5625, -65.0875))
            Line((-55.5625, -65.0875), (55.5625, -65.0875))
            ThreePointArc((55.5625, -65.0875), (62.297692091, -62.297692091), (65.0875, -55.5625))
            Line((65.0875, -55.5625), (65.0875, 55.5625))
            ThreePointArc((65.0875, 55.5625), (62.297692091, 62.297692091), (55.5625, 65.0875))
            Line((55.5625, 65.0875), (-55.5625, 65.0875))
            ThreePointArc((-55.5625, 65.0875), (-62.297692091, 62.297692091), (-65.0875, 55.5625))
        make_face()
        with Locations(Location((-50.8, 50.8, 0), (0, 0, 90))):  # turned: the seam where the file's is
            Circle(SKETCH6_R, mode=Mode.SUBTRACT)
        with Locations(Location((50.8, 50.8, 0), (0, 0, 90))):  # turned: the seam where the file's is
            Circle(SKETCH6_R, mode=Mode.SUBTRACT)
        with Locations(Location((50.8, -50.8, 0), (0, 0, 90))):  # turned: the seam where the file's is
            Circle(SKETCH6_R, mode=Mode.SUBTRACT)
        with Locations(Location((-50.8, -50.8, 0), (0, 0, 90))):  # turned: the seam where the file's is
            Circle(SKETCH6_R, mode=Mode.SUBTRACT)
    extrude(amount=BOSS_EXTRUDE4_DEPTH)

    # Sketch7 → Cut-Extrude3 (cut, up to next)
    with BuildSketch(Plane.XZ.offset(685.8), mode=Mode.PRIVATE) as cut_extrude3_sk1:
        with Locations(Location((0, 0, 0), (0, 0, 270))):  # turned: the seam where the file's is
            Circle(SKETCH7_R)
    cut_extrude3_tool1 = extrude(cut_extrude3_sk1.sketch, amount=-CUT_EXTRUDE3_REACH, mode=Mode.PRIVATE) & part.part
    add(cut_extrude3_tool1.solids().sort_by_distance((0, -685.8, 0))[0], mode=Mode.SUBTRACT)

    # Sketch8 → Boss-Extrude5 (add, two sides)
    with BuildSketch(Plane(origin=(0, 19.05, 0), x_dir=(1, 0, 0), z_dir=(0, 1, 0))) as boss_extrude5_sk:
        with Locations(Location((-50.8, 50.8, 0), (0, 0, 270))):  # turned: the seam where the file's is
            Circle(SKETCH8_R)
        with Locations(Location((50.8, 50.8, 0), (0, 0, 270))):  # turned: the seam where the file's is
            Circle(SKETCH8_R)
        with Locations(Location((50.8, -50.8, 0), (0, 0, 270))):  # turned: the seam where the file's is
            Circle(SKETCH8_R)
        with Locations(Location((-50.8, -50.8, 0), (0, 0, 270))):  # turned: the seam where the file's is
            Circle(SKETCH8_R)
    extrude(amount=BOSS_EXTRUDE5_DEPTH)
    extrude(boss_extrude5_sk.sketch, amount=-BOSS_EXTRUDE5_DEPTH_BACK)


solid = part.part
